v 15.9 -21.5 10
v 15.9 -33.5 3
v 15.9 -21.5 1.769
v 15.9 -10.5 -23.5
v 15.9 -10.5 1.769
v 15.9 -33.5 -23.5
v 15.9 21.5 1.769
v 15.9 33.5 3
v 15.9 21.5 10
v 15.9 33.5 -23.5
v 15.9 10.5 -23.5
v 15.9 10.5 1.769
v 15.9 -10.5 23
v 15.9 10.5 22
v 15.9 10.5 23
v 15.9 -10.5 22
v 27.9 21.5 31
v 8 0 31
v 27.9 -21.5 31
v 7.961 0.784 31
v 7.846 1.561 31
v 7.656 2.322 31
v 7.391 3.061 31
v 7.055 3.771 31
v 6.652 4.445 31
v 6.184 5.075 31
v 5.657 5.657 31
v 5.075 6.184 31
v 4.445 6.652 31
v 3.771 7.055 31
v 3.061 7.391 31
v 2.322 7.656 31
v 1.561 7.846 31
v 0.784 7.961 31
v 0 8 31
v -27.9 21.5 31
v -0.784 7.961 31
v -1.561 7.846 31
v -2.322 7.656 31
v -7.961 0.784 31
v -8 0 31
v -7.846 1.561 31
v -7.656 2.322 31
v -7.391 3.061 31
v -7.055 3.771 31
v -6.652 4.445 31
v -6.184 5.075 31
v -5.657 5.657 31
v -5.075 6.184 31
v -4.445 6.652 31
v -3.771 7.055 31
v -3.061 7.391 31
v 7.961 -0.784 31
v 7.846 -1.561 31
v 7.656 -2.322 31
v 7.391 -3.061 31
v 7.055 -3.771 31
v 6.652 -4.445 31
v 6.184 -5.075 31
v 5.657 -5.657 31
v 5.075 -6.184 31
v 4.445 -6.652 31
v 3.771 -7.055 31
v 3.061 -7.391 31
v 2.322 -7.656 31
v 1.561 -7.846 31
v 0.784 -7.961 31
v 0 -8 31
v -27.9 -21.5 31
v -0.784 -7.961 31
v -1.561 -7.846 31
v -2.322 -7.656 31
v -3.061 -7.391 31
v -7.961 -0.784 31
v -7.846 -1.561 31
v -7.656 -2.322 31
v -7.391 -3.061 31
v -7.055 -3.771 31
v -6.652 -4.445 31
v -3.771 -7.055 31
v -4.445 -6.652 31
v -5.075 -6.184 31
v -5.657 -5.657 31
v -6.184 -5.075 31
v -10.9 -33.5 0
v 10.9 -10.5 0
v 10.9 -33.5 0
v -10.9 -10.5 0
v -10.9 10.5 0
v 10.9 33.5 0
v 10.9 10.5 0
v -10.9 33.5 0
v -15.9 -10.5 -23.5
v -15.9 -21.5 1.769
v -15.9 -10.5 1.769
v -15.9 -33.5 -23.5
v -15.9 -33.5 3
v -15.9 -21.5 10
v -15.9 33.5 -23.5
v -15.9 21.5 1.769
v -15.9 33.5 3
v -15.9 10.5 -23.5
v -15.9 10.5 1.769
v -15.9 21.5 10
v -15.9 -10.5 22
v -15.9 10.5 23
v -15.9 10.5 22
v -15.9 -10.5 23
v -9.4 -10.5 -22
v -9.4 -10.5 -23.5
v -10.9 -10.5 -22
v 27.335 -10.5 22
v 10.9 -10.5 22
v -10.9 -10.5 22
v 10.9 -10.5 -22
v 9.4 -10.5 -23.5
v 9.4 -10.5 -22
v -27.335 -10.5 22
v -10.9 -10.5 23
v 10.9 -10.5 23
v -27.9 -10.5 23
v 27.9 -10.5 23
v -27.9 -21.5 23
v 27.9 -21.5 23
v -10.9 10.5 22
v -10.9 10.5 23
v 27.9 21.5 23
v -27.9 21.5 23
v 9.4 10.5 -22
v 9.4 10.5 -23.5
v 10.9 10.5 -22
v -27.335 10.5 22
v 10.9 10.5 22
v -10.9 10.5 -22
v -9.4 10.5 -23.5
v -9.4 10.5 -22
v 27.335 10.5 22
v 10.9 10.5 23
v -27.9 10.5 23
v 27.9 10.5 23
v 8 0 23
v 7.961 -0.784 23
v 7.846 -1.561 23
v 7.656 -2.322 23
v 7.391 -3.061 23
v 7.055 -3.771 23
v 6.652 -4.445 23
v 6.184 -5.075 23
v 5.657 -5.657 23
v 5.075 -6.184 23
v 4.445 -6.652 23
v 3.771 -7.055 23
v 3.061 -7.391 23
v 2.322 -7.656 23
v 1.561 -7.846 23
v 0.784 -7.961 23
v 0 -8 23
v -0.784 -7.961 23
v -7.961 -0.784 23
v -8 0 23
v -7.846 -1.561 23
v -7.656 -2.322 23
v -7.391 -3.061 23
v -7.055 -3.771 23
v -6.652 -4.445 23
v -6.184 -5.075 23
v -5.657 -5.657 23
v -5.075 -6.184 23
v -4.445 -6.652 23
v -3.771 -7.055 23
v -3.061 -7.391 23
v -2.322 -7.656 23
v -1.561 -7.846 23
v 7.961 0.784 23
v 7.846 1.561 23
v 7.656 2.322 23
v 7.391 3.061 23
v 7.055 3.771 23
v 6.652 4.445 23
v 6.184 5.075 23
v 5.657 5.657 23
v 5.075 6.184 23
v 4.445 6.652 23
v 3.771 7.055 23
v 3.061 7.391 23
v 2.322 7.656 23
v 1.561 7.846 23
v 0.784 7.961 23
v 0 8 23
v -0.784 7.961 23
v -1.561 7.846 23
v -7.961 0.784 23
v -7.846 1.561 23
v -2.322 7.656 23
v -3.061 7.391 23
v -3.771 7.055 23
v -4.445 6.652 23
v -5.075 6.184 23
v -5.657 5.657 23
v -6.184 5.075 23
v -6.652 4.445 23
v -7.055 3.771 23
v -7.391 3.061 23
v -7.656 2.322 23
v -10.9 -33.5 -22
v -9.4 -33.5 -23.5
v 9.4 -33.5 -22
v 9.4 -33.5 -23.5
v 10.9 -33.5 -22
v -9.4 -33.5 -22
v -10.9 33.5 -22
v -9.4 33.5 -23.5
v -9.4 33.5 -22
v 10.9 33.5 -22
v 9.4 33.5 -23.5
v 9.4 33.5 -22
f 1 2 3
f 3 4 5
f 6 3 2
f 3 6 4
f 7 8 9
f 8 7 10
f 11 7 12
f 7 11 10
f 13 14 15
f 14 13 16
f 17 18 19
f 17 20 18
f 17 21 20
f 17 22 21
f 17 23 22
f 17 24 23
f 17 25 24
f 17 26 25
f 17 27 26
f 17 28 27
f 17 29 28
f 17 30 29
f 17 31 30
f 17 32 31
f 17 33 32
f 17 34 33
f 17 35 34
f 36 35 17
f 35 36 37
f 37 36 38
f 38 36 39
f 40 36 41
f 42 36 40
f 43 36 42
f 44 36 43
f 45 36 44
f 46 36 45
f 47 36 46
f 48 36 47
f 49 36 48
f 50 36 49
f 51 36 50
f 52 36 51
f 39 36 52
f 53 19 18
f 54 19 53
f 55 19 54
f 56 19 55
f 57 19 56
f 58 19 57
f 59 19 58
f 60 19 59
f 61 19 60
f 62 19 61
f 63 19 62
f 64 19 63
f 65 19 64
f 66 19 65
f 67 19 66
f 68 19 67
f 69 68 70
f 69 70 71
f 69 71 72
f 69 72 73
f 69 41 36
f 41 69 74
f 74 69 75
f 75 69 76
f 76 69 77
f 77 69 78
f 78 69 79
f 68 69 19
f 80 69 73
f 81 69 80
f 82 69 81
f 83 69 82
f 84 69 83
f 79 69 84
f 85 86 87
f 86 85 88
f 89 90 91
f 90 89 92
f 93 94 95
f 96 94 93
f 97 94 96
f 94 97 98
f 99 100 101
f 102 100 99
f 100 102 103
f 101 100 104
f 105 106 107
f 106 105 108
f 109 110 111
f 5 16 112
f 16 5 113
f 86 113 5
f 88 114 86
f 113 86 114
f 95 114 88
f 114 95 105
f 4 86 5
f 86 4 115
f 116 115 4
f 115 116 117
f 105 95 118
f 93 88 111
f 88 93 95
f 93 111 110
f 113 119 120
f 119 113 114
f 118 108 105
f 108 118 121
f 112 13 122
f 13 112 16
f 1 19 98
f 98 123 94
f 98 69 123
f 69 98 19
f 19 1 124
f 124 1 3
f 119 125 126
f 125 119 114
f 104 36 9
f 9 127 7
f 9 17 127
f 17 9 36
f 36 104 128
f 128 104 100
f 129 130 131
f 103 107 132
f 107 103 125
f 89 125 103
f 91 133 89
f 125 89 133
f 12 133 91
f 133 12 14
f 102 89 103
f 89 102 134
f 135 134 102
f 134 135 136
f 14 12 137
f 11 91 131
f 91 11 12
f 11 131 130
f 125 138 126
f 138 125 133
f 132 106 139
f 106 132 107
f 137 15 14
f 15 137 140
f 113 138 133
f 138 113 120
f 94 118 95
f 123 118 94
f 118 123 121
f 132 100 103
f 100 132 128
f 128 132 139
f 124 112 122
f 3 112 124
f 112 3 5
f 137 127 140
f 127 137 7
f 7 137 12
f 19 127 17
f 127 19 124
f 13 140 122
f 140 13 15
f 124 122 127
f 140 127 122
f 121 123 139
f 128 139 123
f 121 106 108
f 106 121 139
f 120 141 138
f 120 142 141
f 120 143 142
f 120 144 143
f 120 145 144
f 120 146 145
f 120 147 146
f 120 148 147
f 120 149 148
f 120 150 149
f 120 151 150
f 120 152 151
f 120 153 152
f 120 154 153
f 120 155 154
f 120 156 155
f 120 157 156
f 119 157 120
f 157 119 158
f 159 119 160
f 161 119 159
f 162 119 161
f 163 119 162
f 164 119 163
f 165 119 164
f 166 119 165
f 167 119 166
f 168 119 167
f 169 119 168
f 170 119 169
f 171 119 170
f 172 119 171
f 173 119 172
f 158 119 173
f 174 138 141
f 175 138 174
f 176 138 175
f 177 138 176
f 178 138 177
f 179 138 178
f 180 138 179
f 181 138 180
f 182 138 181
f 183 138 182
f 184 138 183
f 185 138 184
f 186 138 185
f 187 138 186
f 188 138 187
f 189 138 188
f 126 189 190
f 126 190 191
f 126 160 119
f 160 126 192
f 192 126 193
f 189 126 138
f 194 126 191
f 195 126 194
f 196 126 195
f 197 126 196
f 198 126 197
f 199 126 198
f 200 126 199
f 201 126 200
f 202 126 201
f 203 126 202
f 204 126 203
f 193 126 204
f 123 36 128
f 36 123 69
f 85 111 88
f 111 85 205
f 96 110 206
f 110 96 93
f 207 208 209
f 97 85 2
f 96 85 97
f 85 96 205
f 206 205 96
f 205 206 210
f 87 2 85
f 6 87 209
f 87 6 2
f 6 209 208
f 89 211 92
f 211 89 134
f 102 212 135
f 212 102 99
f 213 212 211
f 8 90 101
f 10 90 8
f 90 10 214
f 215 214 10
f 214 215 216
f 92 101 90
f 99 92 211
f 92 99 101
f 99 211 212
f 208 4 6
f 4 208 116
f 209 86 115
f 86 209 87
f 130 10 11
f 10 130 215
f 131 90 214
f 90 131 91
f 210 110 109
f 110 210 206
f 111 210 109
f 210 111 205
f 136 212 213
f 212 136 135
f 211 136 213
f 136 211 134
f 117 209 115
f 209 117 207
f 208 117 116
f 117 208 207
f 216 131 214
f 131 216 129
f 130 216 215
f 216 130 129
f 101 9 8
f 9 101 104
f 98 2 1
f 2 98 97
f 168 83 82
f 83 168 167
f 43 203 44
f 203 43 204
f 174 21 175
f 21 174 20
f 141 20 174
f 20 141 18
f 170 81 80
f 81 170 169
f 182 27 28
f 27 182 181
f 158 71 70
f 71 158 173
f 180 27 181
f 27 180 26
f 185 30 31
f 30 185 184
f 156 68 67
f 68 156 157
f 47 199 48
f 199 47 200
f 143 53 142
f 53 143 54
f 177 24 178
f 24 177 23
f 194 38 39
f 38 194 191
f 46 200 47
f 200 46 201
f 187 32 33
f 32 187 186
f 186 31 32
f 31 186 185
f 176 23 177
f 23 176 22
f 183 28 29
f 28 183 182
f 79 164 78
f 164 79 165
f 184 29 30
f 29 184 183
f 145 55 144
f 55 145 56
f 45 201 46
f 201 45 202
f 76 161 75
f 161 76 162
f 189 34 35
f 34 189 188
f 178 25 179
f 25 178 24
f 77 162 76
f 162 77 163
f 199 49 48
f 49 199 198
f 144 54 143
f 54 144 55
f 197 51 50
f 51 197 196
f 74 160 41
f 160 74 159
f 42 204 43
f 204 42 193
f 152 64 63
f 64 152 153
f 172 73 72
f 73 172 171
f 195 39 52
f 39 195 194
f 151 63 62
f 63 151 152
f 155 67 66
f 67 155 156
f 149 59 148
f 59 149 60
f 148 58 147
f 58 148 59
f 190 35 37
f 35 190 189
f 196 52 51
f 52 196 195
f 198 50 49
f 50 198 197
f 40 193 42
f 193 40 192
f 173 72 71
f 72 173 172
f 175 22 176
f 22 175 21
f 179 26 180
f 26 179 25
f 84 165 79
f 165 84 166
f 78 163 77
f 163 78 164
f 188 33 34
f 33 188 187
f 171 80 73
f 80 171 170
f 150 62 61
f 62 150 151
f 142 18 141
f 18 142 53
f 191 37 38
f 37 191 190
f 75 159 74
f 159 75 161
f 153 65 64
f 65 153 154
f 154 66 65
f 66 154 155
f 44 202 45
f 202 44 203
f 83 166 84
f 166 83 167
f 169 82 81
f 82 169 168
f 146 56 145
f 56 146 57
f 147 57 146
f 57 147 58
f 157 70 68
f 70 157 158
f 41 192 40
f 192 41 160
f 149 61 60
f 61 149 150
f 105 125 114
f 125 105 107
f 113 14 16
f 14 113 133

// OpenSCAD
// v1.11, mm. X=upper gray tube axis; Y=blue foot axis; Z=up.
// Resize mating envelopes, NOT a global scale: walls, eaves, bore and ramp
// heights keep their accepted sizes. Actual context tubes remain 20x20.
$fn=48;

module guard_v1_11(nx=21,ny=21,nz=22,feature="all") {
    wall=5;
    inner_x=nx+0.8; // Preserve the pre-existing PETG printing relief.
    outer_x=inner_x+2*wall;
    wall_x=inner_x/2+wall/2;
    inner_y=ny/2;
    root_y=inner_y+11;
    tip_y=root_y+12;
    roof_bottom=nz+1;
    roof_top=roof_bottom+8;
    roof_half_x=outer_x/2+12;
    bottom_z=-nz-1.5;
    // Keep the real 20 mm foot's 0.6 mm engagement rather than moving the
    // lip tip outward with nx (which would leave only 0.1 mm engagement).
    lip_tip_x=20/2-0.6;
    lip_depth=wall_x-lip_tip_x;

    assert(nx>=20 && ny>=20 && nz>=20);
    assert(lip_depth>0 && lip_depth<wall+inner_x/2);

    module upper_body() {
        for(s=[-1,1]) {
            // Solid XZ upper U web, down from the roof to blue top Z=0.
            translate([0,s*(inner_y+root_y)/2,roof_top/2])
                cube([outer_x,11,roof_top],center=true);
            translate([s*wall_x,0,roof_top/2])
                cube([wall,2*root_y,roof_top],center=true);
        }
        translate([0,0,roof_bottom+4])
            cube([2*roof_half_x,2*root_y,8],center=true);
        for(sx=[-1,1]) for(sy=[-1,1])
            translate([0,sy*(inner_y+root_y)/2,0])
                rotate([90,0,0]) linear_extrude(height=11,center=true)
                    polygon([
                        [sx*roof_half_x,roof_bottom],
                        [sx*(outer_x/2-1),roof_bottom+0.5],
                        [sx*(outer_x/2-1),0]
                    ]);
    }
    module hooks() {
        for(sx=[-1,1]) for(sy=[-1,1])
            translate([sx*(lip_tip_x+lip_depth/2),
                       sy*(inner_y+tip_y)/2,-nz-0.75])
                cube([lip_depth,tip_y-inner_y,1.5],center=true);
    }
    module lower_body() {
        for(sx=[-1,1]) for(sy=[-1,1])
            translate([sx*wall_x,sy*(inner_y+tip_y)/2,bottom_z/2])
                cube([wall,tip_y-inner_y,-bottom_z],center=true);
        hooks();
    }
    module positive_ramp() {
        rotate([90,0,90]) linear_extrude(height=outer_x,center=true)
            polygon([[root_y-0.2,0],[tip_y,0],[tip_y,3],
                     [root_y,10],[root_y-0.2,10]]);
    }
    module end_ramps() {
        positive_ramp(); mirror([0,1,0]) positive_ramp();
        for(sx=[-1,1]) for(sy=[-1,1])
            translate([sx*wall_x,sy*(root_y+tip_y)/2,0])
                cube([wall,12,0.4],center=true);
    }

    difference() {
        union() {
            if(feature=="all" || feature=="upper") upper_body();
            if(feature=="all" || feature=="lower") lower_body();
            if(feature=="all" || feature=="ramps") end_ramps();
            if(feature=="hooks") hooks();
        }
        // True, unstepped round nut passage through the ENTIRE final part.
        cylinder(d=16,h=160,center=true,$fn=64);
        // Bottom-open gray-tube entry, ny wide and nz high. This removes
        // upper rigid interference without deleting either XZ solid web.
        translate([-60,-ny/2,-60]) cube([120,ny,60+nz]);
    }
}

guard_v1_11();
